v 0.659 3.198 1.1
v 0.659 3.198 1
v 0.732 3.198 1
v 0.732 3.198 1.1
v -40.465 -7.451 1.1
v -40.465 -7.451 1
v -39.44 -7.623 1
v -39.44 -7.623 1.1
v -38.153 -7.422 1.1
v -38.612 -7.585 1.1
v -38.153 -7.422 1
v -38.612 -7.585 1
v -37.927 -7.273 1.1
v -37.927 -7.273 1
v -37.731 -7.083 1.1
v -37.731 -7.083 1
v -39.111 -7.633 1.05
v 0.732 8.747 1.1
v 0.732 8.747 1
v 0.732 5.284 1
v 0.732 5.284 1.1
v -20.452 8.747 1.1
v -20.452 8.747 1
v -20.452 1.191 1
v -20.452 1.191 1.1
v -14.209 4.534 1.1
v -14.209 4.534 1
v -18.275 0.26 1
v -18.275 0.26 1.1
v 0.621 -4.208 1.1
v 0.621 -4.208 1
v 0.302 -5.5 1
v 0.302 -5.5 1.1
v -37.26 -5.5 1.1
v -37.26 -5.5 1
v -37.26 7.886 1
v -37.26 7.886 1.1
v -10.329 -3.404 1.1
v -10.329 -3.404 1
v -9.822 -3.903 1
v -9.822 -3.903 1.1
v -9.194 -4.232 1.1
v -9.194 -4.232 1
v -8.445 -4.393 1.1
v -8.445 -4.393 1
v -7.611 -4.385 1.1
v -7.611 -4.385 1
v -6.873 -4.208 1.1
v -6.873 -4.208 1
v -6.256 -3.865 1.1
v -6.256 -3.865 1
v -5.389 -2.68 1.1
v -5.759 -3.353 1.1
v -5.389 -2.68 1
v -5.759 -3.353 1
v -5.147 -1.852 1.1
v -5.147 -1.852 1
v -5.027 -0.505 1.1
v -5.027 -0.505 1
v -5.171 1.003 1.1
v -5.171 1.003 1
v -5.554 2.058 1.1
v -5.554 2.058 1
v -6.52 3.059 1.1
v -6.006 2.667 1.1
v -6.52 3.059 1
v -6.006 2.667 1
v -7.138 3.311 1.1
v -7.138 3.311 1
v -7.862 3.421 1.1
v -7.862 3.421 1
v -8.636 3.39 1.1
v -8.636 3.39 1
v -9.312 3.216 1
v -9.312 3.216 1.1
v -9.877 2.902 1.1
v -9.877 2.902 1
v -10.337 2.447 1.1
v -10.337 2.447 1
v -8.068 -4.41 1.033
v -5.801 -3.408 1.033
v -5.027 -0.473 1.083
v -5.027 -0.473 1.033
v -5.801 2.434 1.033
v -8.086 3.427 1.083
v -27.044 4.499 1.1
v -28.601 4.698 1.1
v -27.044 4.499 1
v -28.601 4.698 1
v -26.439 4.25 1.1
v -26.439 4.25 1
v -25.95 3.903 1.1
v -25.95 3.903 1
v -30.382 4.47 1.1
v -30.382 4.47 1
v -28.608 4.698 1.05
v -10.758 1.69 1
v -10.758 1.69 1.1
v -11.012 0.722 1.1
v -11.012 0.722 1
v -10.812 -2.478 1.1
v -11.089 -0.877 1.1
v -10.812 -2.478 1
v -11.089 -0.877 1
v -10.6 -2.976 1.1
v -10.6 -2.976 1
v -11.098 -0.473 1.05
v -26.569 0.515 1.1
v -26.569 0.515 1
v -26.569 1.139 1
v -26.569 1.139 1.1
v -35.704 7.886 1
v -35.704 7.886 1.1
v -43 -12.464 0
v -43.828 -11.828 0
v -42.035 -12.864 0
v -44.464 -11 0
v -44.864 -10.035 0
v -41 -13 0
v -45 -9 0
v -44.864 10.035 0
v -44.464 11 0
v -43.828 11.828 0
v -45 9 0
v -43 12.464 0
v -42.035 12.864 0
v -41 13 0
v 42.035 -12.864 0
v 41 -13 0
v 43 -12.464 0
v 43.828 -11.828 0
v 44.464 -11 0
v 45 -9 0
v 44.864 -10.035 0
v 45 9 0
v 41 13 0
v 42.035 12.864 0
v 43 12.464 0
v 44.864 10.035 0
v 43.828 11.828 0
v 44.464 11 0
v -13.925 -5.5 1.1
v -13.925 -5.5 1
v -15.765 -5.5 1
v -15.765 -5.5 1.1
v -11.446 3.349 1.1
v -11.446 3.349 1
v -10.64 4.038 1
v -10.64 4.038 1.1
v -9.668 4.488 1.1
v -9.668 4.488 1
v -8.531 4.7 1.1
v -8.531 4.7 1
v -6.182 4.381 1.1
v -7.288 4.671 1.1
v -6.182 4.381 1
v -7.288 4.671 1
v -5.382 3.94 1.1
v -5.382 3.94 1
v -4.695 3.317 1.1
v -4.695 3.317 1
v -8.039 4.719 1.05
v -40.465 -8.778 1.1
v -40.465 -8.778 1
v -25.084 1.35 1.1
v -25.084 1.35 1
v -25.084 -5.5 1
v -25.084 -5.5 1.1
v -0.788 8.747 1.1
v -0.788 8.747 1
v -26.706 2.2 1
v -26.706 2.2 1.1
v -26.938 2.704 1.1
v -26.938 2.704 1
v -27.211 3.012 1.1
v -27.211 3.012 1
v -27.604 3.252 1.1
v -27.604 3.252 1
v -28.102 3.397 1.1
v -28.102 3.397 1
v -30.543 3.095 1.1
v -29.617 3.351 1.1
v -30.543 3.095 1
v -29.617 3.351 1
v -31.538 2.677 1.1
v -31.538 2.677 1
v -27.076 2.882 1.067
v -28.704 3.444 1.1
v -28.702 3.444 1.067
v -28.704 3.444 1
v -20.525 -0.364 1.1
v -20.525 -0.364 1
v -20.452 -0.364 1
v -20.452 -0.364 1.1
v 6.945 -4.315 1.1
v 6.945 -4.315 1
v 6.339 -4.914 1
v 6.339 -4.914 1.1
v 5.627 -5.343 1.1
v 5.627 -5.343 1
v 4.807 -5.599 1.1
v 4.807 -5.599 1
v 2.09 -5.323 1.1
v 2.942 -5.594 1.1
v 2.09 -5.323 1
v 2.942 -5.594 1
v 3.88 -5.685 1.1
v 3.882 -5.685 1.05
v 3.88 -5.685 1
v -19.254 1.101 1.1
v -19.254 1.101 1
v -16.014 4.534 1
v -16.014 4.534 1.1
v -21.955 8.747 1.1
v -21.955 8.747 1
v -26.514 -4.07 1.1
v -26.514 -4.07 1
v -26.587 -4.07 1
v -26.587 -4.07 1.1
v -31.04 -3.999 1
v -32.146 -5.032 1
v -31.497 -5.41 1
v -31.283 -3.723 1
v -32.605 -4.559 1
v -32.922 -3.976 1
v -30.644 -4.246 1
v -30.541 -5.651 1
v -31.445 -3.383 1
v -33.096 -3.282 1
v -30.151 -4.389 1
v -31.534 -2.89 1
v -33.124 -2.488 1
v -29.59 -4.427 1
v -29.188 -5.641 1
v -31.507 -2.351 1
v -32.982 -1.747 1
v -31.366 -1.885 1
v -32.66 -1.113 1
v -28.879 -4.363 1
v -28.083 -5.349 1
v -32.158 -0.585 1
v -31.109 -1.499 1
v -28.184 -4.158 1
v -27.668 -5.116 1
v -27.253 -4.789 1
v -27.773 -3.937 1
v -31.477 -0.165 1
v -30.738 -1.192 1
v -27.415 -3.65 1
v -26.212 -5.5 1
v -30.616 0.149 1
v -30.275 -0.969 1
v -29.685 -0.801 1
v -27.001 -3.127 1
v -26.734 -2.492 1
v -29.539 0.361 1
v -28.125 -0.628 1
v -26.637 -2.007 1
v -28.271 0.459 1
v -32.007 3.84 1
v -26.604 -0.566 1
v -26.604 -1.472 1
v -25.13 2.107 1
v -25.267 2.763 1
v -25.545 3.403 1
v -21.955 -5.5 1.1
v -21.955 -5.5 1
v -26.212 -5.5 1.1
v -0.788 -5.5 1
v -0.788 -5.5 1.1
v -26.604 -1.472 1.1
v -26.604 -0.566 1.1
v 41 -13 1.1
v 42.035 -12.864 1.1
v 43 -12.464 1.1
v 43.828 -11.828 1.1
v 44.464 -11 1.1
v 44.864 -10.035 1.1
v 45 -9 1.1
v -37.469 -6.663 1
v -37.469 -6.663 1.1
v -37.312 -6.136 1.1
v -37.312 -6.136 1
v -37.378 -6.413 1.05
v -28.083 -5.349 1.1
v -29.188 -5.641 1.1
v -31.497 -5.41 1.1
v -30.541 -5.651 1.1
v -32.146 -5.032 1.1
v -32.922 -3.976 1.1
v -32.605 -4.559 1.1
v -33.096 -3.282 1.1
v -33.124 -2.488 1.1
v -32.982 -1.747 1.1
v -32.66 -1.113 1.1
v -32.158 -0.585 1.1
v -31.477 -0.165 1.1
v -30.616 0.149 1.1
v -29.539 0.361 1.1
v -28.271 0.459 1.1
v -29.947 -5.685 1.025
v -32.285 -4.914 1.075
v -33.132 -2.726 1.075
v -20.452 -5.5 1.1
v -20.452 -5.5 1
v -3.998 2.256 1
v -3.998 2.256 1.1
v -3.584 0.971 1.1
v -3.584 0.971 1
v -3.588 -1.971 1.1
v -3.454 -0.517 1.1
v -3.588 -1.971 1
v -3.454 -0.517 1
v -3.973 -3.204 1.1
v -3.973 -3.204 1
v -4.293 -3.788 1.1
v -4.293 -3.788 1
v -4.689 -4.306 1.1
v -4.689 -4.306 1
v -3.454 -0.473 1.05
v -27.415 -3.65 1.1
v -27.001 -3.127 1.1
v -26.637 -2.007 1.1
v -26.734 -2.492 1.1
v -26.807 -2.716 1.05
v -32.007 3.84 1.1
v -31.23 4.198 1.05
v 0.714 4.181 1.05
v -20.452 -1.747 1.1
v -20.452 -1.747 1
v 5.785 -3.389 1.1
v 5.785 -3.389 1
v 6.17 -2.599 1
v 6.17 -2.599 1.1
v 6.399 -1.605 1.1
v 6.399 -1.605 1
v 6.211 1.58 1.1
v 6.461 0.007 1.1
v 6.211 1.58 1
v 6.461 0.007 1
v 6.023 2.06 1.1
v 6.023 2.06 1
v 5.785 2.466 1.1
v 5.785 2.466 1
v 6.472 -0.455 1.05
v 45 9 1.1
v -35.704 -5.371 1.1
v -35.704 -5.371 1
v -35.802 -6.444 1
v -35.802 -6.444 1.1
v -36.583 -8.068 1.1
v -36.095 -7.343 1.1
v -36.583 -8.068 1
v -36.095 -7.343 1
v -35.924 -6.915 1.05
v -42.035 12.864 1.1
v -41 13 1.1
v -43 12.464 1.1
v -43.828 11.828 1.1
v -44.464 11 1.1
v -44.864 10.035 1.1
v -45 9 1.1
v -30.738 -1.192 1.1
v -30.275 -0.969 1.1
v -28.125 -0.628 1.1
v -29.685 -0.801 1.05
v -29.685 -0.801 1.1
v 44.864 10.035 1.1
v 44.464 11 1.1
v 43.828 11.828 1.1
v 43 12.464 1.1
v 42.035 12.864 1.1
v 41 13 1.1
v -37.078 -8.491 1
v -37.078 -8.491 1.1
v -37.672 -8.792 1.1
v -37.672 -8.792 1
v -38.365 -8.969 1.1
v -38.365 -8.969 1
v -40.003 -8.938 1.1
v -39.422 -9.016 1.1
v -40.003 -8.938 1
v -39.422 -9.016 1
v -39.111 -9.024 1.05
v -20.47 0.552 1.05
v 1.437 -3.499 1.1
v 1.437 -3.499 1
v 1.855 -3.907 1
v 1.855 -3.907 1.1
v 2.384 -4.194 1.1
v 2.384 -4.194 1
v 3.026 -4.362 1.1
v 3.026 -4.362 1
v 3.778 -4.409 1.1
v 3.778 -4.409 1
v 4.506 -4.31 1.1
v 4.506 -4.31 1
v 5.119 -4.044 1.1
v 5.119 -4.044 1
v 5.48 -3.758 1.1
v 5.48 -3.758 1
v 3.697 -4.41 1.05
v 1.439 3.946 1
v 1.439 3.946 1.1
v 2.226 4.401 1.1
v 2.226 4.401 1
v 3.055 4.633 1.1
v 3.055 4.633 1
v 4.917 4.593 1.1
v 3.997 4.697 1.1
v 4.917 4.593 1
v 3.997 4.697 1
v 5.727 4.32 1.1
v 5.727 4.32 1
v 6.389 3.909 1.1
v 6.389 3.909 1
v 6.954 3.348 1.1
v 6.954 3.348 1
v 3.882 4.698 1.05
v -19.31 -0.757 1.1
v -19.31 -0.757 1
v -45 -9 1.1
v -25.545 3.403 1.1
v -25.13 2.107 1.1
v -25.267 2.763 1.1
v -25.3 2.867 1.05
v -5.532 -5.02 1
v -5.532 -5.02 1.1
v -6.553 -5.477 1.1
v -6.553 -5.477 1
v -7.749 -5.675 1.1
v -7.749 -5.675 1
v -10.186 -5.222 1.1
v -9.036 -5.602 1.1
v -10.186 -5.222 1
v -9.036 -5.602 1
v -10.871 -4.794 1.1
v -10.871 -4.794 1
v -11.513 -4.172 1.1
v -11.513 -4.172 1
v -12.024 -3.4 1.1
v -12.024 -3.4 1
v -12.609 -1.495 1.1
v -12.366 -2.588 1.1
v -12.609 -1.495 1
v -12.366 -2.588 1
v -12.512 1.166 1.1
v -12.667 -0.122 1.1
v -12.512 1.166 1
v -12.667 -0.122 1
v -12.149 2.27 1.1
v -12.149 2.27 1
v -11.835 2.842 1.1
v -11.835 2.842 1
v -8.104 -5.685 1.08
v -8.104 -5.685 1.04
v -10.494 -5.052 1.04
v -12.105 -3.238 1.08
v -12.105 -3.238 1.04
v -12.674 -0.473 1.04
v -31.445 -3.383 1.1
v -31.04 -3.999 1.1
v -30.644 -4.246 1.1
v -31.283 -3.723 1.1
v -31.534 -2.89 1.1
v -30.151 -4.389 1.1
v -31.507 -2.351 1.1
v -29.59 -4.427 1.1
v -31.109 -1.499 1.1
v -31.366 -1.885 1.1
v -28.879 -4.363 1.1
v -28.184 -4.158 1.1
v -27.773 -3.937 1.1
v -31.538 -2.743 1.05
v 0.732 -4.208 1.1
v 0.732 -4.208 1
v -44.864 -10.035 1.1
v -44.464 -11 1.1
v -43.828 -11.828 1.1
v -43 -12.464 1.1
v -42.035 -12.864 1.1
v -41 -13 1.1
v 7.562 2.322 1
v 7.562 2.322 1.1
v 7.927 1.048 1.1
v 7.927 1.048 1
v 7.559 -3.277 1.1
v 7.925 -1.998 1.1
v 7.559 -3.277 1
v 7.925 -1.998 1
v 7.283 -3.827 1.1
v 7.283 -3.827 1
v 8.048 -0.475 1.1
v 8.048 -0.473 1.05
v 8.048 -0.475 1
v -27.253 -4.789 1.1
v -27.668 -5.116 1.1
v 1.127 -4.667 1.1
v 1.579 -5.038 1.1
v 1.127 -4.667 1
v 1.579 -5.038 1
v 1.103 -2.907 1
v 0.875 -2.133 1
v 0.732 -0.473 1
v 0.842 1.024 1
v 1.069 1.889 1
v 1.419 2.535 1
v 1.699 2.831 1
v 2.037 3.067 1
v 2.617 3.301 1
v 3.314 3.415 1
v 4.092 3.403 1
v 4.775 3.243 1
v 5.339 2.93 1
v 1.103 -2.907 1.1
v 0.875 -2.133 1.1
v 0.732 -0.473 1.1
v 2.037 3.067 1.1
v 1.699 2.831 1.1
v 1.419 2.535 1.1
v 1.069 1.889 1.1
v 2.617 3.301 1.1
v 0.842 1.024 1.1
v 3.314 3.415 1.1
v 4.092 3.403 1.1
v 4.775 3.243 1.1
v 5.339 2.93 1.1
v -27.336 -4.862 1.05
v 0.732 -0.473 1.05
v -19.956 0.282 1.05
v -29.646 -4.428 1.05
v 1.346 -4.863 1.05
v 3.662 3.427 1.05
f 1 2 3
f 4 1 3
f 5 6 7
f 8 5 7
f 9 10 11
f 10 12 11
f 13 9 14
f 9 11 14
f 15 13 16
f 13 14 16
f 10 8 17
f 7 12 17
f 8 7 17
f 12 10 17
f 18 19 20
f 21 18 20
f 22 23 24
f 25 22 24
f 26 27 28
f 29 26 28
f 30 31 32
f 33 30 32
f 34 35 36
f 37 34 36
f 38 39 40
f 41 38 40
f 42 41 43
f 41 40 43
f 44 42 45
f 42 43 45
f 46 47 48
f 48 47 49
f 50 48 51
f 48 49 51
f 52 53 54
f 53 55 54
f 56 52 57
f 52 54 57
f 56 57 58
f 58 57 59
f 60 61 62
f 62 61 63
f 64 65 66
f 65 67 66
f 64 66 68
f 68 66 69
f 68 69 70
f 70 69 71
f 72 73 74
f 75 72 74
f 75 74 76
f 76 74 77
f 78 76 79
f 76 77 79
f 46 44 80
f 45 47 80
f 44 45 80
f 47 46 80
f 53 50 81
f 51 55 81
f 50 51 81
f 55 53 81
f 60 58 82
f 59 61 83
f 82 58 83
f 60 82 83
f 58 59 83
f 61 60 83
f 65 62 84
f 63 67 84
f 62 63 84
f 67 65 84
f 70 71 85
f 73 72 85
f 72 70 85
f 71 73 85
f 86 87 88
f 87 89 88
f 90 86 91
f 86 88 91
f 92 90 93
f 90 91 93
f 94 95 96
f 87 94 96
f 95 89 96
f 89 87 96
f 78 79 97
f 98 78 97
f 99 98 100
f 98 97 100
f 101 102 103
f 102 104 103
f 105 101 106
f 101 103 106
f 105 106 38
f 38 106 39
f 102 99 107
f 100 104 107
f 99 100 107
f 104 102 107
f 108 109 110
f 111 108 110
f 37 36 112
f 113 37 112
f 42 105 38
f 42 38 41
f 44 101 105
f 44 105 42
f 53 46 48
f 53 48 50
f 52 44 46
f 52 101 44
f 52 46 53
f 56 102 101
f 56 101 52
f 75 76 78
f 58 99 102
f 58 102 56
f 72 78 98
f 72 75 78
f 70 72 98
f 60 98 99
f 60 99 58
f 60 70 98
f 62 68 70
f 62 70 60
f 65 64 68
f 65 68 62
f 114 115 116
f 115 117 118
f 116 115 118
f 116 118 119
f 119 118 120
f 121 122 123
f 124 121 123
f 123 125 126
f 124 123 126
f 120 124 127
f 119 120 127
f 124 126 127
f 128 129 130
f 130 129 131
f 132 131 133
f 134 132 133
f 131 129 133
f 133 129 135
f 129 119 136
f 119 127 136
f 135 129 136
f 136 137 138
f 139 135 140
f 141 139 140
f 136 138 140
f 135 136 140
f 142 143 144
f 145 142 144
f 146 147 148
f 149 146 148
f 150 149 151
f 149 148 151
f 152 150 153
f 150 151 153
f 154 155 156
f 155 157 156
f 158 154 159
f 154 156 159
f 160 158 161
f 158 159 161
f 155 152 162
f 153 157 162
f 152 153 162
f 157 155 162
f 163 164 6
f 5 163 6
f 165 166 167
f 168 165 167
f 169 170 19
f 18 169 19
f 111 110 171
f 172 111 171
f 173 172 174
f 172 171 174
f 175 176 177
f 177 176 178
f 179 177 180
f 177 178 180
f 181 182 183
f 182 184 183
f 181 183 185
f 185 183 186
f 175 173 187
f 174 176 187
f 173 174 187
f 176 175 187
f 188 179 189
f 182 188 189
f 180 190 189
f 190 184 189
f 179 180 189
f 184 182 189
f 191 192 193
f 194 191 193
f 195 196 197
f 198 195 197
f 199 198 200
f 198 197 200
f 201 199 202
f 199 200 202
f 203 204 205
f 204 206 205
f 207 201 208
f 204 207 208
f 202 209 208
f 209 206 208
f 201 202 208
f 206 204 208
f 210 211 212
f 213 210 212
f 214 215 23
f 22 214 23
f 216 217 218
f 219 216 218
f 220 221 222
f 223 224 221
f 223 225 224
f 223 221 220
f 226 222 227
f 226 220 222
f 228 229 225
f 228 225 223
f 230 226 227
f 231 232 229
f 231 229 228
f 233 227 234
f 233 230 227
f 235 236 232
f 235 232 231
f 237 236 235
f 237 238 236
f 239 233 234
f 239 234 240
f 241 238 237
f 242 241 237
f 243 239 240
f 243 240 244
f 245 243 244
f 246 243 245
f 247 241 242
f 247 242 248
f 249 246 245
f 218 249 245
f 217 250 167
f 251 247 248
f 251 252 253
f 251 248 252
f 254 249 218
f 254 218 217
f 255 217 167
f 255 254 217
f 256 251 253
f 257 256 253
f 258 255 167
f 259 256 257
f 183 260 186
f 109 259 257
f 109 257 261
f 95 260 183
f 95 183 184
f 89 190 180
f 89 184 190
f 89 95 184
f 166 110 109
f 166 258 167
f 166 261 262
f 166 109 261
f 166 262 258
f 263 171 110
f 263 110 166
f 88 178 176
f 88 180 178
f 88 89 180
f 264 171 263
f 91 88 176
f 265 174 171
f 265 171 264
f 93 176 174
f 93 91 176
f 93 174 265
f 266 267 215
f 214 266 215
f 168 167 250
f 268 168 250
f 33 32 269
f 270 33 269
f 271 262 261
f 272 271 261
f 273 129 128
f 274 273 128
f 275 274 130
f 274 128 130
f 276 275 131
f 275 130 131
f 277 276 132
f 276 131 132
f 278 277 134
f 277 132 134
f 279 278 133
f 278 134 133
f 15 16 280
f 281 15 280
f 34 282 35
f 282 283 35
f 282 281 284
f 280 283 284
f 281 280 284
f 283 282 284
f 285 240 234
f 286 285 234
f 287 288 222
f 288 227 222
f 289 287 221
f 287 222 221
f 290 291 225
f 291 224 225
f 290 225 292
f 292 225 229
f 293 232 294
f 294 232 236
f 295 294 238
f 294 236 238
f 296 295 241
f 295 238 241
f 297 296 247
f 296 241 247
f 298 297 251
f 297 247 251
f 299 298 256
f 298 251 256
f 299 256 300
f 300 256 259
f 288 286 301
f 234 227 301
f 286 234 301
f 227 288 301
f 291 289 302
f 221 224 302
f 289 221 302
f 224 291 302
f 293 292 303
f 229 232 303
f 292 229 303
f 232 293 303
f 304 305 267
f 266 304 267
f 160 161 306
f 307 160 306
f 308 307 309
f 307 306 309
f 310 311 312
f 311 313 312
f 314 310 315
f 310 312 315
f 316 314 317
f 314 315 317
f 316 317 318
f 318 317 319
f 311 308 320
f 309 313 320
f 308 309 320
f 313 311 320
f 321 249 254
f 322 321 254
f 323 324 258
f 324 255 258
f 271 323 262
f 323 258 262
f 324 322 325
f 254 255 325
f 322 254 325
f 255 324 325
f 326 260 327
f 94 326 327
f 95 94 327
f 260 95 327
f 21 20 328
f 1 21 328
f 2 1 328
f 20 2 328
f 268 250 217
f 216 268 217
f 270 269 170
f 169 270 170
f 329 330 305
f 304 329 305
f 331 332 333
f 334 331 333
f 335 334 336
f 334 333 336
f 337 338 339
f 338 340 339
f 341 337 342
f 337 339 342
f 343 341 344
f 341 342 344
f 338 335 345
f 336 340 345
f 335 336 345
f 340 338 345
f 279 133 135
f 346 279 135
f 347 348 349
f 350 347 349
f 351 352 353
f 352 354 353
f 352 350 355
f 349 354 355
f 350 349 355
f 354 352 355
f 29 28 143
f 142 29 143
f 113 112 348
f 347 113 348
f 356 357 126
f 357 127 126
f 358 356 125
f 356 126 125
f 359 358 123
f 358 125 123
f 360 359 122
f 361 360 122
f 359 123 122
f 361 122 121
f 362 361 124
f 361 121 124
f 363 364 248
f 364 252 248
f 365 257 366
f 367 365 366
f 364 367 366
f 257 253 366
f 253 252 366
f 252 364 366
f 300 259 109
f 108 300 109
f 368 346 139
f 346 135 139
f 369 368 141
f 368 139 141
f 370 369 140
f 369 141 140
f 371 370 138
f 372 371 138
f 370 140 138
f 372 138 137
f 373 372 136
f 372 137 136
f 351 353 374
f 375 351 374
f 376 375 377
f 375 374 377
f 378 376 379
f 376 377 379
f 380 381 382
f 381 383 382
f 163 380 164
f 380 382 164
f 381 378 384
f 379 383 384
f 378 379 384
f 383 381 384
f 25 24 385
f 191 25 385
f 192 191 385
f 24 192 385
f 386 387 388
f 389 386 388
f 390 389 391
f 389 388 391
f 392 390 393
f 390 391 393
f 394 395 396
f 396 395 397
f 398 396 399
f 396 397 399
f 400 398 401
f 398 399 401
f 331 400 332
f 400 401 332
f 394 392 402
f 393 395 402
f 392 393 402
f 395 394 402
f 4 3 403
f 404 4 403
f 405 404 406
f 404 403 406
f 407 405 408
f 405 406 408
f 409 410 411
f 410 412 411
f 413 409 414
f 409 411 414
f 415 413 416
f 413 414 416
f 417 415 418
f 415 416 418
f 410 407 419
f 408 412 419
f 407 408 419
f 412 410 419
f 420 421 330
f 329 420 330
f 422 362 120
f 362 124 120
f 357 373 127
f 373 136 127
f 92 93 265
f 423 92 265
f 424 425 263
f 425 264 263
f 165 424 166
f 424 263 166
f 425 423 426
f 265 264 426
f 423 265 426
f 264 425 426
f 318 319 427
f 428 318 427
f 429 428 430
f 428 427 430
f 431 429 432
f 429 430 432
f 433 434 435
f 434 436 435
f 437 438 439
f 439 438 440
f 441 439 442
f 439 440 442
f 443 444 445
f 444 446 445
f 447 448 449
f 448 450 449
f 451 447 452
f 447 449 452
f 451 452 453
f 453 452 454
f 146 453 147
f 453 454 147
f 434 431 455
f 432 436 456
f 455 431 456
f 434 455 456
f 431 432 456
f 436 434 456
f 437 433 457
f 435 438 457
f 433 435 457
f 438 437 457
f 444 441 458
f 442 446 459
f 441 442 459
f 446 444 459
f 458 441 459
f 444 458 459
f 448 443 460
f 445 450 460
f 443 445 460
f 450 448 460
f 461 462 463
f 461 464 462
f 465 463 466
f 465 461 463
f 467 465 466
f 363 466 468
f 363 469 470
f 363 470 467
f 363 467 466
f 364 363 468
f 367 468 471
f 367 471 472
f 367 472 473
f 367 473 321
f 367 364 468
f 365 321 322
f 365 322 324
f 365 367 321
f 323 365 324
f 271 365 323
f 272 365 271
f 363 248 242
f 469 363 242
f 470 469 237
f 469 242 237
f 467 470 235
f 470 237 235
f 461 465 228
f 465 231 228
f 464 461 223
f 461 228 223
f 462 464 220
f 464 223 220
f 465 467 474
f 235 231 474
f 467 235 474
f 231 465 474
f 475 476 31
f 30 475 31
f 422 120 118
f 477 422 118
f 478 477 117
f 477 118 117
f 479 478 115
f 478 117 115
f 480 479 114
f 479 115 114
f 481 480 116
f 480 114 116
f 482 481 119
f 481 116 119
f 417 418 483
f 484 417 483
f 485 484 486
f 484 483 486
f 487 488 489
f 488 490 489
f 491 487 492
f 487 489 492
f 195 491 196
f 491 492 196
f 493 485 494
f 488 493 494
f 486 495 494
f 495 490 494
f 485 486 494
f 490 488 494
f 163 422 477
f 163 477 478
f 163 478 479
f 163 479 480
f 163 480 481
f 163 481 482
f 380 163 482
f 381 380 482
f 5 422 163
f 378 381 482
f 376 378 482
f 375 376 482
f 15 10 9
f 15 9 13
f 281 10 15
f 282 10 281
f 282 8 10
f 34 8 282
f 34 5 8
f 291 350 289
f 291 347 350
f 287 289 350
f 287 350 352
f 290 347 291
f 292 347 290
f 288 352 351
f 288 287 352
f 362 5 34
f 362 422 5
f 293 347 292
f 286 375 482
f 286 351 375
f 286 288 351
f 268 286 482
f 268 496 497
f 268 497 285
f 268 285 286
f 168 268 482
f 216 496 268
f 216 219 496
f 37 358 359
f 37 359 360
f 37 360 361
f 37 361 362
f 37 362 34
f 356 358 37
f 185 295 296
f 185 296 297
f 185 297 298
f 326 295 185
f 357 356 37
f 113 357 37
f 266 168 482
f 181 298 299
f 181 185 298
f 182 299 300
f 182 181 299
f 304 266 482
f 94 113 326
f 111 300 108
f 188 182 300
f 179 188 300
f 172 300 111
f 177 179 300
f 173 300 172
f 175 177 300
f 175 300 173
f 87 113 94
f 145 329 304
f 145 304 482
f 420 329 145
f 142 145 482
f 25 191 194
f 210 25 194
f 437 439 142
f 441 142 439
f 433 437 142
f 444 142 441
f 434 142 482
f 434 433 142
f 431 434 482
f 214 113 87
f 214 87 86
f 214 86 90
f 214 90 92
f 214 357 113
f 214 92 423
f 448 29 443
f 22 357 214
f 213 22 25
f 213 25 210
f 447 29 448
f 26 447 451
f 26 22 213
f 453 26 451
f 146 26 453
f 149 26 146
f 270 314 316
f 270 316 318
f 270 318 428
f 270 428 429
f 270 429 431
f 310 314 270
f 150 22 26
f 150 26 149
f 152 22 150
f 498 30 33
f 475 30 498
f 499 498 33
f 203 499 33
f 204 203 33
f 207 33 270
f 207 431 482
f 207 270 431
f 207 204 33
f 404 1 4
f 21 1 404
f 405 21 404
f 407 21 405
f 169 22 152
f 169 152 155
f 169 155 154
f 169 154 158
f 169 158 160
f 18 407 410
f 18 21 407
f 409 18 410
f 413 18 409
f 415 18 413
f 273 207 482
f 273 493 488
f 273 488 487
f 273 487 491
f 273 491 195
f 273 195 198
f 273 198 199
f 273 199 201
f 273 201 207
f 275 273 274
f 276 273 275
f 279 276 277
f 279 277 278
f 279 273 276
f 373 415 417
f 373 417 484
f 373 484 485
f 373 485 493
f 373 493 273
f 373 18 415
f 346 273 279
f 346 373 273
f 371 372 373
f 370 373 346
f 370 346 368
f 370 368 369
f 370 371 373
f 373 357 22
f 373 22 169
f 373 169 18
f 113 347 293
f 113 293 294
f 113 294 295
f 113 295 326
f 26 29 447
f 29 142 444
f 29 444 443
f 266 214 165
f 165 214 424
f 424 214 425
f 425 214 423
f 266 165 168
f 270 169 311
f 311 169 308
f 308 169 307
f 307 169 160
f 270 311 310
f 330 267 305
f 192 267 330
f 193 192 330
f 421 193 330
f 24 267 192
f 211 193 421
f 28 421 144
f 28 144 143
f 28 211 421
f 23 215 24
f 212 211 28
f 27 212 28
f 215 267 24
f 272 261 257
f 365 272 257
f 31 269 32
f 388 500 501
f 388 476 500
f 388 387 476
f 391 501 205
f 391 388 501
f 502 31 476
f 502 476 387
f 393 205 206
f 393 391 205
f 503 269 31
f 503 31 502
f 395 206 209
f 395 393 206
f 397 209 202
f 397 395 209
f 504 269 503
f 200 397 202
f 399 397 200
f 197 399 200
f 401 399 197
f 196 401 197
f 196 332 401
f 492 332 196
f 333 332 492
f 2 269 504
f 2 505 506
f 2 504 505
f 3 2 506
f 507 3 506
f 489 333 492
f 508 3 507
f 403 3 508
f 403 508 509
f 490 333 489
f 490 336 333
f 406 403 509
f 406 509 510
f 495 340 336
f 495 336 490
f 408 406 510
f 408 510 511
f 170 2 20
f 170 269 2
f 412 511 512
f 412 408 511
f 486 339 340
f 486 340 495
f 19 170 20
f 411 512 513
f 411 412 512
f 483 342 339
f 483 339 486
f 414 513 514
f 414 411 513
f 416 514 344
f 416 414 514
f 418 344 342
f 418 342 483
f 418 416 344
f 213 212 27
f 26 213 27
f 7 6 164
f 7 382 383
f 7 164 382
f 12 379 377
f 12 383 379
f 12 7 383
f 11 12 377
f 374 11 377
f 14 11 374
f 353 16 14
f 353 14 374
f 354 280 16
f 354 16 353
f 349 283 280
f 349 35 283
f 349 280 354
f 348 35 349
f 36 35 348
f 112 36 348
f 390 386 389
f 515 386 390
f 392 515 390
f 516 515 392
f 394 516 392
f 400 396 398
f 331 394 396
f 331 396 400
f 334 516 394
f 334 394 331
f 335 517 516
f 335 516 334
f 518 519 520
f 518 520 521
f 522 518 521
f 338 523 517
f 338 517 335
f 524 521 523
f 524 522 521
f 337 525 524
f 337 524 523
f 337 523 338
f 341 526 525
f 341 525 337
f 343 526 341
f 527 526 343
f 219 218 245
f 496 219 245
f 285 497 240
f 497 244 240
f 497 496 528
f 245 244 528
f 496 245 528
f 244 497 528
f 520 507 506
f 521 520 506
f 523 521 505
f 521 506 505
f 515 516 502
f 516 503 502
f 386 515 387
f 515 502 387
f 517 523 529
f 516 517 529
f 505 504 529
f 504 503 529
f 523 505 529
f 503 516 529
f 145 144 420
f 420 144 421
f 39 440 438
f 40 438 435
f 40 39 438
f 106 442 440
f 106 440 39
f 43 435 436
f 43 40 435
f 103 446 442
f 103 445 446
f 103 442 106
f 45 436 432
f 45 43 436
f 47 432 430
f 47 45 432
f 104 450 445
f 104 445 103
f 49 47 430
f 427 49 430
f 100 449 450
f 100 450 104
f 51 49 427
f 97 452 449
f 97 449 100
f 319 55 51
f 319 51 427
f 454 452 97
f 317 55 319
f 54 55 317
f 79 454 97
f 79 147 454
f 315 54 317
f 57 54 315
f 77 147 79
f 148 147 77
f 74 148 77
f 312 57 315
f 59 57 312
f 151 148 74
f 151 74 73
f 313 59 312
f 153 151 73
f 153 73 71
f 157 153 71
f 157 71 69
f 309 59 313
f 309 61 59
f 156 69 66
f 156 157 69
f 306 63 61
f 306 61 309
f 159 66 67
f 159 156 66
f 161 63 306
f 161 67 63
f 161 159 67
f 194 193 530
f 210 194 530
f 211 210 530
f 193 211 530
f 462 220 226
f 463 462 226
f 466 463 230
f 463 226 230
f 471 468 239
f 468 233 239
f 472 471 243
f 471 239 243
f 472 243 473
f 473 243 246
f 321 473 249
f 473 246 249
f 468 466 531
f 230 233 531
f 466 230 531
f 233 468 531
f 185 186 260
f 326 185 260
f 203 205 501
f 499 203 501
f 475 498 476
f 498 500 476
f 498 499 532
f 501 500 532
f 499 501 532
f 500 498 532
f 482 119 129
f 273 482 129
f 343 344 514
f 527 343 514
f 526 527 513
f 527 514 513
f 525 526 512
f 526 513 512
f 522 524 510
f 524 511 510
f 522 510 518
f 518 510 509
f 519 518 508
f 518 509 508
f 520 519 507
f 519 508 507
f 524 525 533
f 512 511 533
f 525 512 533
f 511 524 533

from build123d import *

# Parameters (mm, degrees)
F1_DEPTH = 1
F3_DEPTH = 0.1


with BuildPart() as f1:
    # F0 (on Top) → F1 (new body)
    with BuildSketch(Plane.XY):
        with BuildLine():
            ThreePointArc((45, 9), (43.8284271247, 11.8284271247), (41, 13))
            Line((41, 13), (-41, 13))
            ThreePointArc((-41, 13), (-43.8284271247, 11.8284271247), (-45, 9))
            Line((-45, 9), (-45, -9))
            ThreePointArc((-45, -9), (-43.8284271247, -11.8284271247), (-41, -13))
            Line((-41, -13), (41, -13))
            ThreePointArc((41, -13), (43.8284271247, -11.8284271247), (45, -9))
            Line((45, -9), (45, 9))
        make_face()
    extrude(amount=F1_DEPTH)

    # F2 (on face) → F3 (join)
    with BuildSketch(Plane.XY.offset(1)):
        with BuildLine():
            Line((45, -9), (45, 9))
            ThreePointArc((45, 9), (43.8284271247, 11.8284271247), (41, 13))
            Line((41, 13), (-41, 13))
            ThreePointArc((-41, 13), (-43.8284271247, 11.8284271247), (-45, 9))
            Line((-45, 9), (-45, -9))
            ThreePointArc((-45, -9), (-43.8284271247, -11.8284271247), (-41, -13))
            Line((-41, -13), (41, -13))
            ThreePointArc((41, -13), (43.8284271247, -11.8284271247), (45, -9))
        make_face()
        with BuildLine():
            Line((-40, 10), (40, 10))
            ThreePointArc((40, 10), (41.4142135624, 9.4142135624), (42, 8))
            Line((42, 8), (42, -8))
            ThreePointArc((42, -8), (41.4142135624, -9.4142135624), (40, -10))
            Line((40, -10), (-40, -10))
            ThreePointArc((-40, -10), (-41.4142135624, -9.4142135624), (-42, -8))
            Line((-42, -8), (-42, 8))
            ThreePointArc((-42, 8), (-41.4142135624, 9.4142135624), (-40, 10))
        make_face(mode=Mode.SUBTRACT)
        with BuildLine():
            ThreePointArc((42, 8), (41.4142135624, 9.4142135624), (40, 10))
            Line((40, 10), (-40, 10))
            ThreePointArc((-40, 10), (-41.4142135624, 9.4142135624), (-42, 8))
            Line((-42, 8), (-42, -8))
            ThreePointArc((-42, -8), (-41.4142135624, -9.4142135624), (-40, -10))
            Line((-40, -10), (40, -10))
            ThreePointArc((40, -10), (41.4142135624, -9.4142135624), (42, -8))
            Line((42, -8), (42, 8))
        make_face()
        with BuildLine():
            add(Edge.make_bspline(
                [(-36.5830078125, -8.0678710938), (-37.4619140625, -9.0244140625), (-39.111328125, -9.0244140625)],
                knots=[0, 0, 0, 1, 1, 1], degree=2))
            add(Edge.make_bspline(
                [(-39.111328125, -9.0244140625), (-39.9697265625, -9.0244140625), (-40.46484375, -8.7783203125)],
                knots=[0, 0, 0, 1, 1, 1], degree=2))
            Line((-40.46484375, -8.7783203125), (-40.46484375, -7.451171875))
            add(Edge.make_bspline(
                [(-40.46484375, -7.451171875), (-39.814453125, -7.6328125), (-39.111328125, -7.6328125)],
                knots=[0, 0, 0, 1, 1, 1], degree=2))
            add(Edge.make_bspline(
                [(-39.111328125, -7.6328125), (-38.203125, -7.6328125), (-37.7314453125, -7.0834960938)],
                knots=[0, 0, 0, 1, 1, 1], degree=2))
            add(Edge.make_bspline(
                [(-37.7314453125, -7.0834960938), (-37.259765625, -6.5341796875), (-37.259765625, -5.5)],
                knots=[0, 0, 0, 1, 1, 1], degree=2))
            Line((-37.259765625, -5.5), (-37.259765625, 7.8857421875))
            Line((-37.259765625, 7.8857421875), (-35.7041015625, 7.8857421875))
            Line((-35.7041015625, 7.8857421875), (-35.7041015625, -5.37109375))
            add(Edge.make_bspline(
                [(-35.7041015625, -5.37109375), (-35.7041015625, -7.111328125), (-36.5830078125, -8.0678710938)],
                knots=[0, 0, 0, 1, 1, 1], degree=2))
        make_face(mode=Mode.SUBTRACT)
        with BuildLine():
            Line((-25.083984375, -5.5), (-26.2119140625, -5.5))
            Line((-26.2119140625, -5.5), (-26.513671875, -4.0703125))
            Line((-26.513671875, -4.0703125), (-26.5869140625, -4.0703125))
            add(Edge.make_bspline(
                [(-26.5869140625, -4.0703125), (-27.3369140625, -5.013671875), (-28.0825195312, -5.3491210938)],
                knots=[0, 0, 0, 1, 1, 1], degree=2))
            add(Edge.make_bspline(
                [(-28.0825195312, -5.3491210938), (-28.828125, -5.6845703125), (-29.947265625, -5.6845703125)],
                knots=[0, 0, 0, 1, 1, 1], degree=2))
            add(Edge.make_bspline(
                [(-29.947265625, -5.6845703125), (-31.4384765625, -5.6845703125), (-32.28515625, -4.9140625)],
                knots=[0, 0, 0, 1, 1, 1], degree=2))
            add(Edge.make_bspline(
                [(-32.28515625, -4.9140625), (-33.1318359375, -4.1435546875), (-33.1318359375, -2.7255859375)],
                knots=[0, 0, 0, 1, 1, 1], degree=2))
            add(Edge.make_bspline(
                [(-33.1318359375, -2.7255859375), (-33.1318359375, 0.3125), (-28.271484375, 0.458984375)],
                knots=[0, 0, 0, 1, 1, 1], degree=2))
            Line((-28.271484375, 0.458984375), (-26.5693359375, 0.5146484375))
            Line((-26.5693359375, 0.5146484375), (-26.5693359375, 1.138671875))
            add(Edge.make_bspline(
                [(-26.5693359375, 1.138671875), (-26.5693359375, 2.3193359375), (-27.076171875, 2.8818359375)],
                knots=[0, 0, 0, 1, 1, 1], degree=2))
            add(Edge.make_bspline(
                [(-27.076171875, 2.8818359375), (-27.5830078125, 3.4443359375), (-28.7021484375, 3.4443359375)],
                knots=[0, 0, 0, 1, 1, 1], degree=2))
            add(Edge.make_bspline(
                [(-28.7021484375, 3.4443359375), (-29.9560546875, 3.4443359375), (-31.5380859375, 2.6767578125)],
                knots=[0, 0, 0, 1, 1, 1], degree=2))
            Line((-31.5380859375, 2.6767578125), (-32.0068359375, 3.83984375))
            add(Edge.make_bspline(
                [(-32.0068359375, 3.83984375), (-31.265625, 4.2412109375), (-30.3823242188, 4.4697265625)],
                knots=[0, 0, 0, 1, 1, 1], degree=2))
            add(Edge.make_bspline(
                [(-30.3823242188, 4.4697265625), (-29.4990234375, 4.6982421875), (-28.6083984375, 4.6982421875)],
                knots=[0, 0, 0, 1, 1, 1], degree=2))
            add(Edge.make_bspline(
                [(-28.6083984375, 4.6982421875), (-26.8154296875, 4.6982421875), (-25.9497070312, 3.9028320312)],
                knots=[0, 0, 0, 1, 1, 1], degree=2))
            add(Edge.make_bspline(
                [(-25.9497070312, 3.9028320312), (-25.083984375, 3.107421875), (-25.083984375, 1.349609375)],
                knots=[0, 0, 0, 1, 1, 1], degree=2))
            Line((-25.083984375, 1.349609375), (-25.083984375, -5.5))
        make_face(mode=Mode.SUBTRACT)
        with BuildLine():
            add(Edge.make_bspline(
                [(-4.6948242187, 3.3168945312), (-3.4541015625, 1.9150390625), (-3.4541015625, -0.47265625)],
                knots=[0, 0, 0, 1, 1, 1], degree=2))
            add(Edge.make_bspline(
                [(-3.4541015625, -0.47265625), (-3.4541015625, -2.927734375), (-4.6889648437, -4.3061523438)],
                knots=[0, 0, 0, 1, 1, 1], degree=2))
            add(Edge.make_bspline(
                [(-4.6889648437, -4.3061523438), (-5.923828125, -5.6845703125), (-8.103515625, -5.6845703125)],
                knots=[0, 0, 0, 1, 1, 1], degree=2))
            add(Edge.make_bspline(
                [(-8.103515625, -5.6845703125), (-9.451171875, -5.6845703125), (-10.494140625, -5.0517578125)],
                knots=[0, 0, 0, 1, 1, 1], degree=2))
            add(Edge.make_bspline(
                [(-10.494140625, -5.0517578125), (-11.537109375, -4.4189453125), (-12.10546875, -3.23828125)],
                knots=[0, 0, 0, 1, 1, 1], degree=2))
            add(Edge.make_bspline(
                [(-12.10546875, -3.23828125), (-12.673828125, -2.0576171875), (-12.673828125, -0.47265625)],
                knots=[0, 0, 0, 1, 1, 1], degree=2))
            add(Edge.make_bspline(
                [(-12.673828125, -0.47265625), (-12.673828125, 1.9794921875), (-11.4462890625, 3.3491210937)],
                knots=[0, 0, 0, 1, 1, 1], degree=2))
            add(Edge.make_bspline(
                [(-11.4462890625, 3.3491210937), (-10.21875, 4.71875), (-8.0390625, 4.71875)],
                knots=[0, 0, 0, 1, 1, 1], degree=2))
            add(Edge.make_bspline(
                [(-8.0390625, 4.71875), (-5.935546875, 4.71875), (-4.6948242187, 3.3168945312)],
                knots=[0, 0, 0, 1, 1, 1], degree=2))
        make_face(mode=Mode.SUBTRACT)
        with BuildLine():
            Line((-20.525390625, -0.3642578125), (-20.4521484375, -0.3642578125))
            add(Edge.make_bspline(
                [(-20.4521484375, -0.3642578125), (-20.0595703125, 0.1953125), (-19.25390625, 1.1005859375)],
                knots=[0, 0, 0, 1, 1, 1], degree=2))
            Line((-19.25390625, 1.1005859375), (-16.013671875, 4.5341796875))
            Line((-16.013671875, 4.5341796875), (-14.208984375, 4.5341796875))
            Line((-14.208984375, 4.5341796875), (-18.275390625, 0.259765625))
            Line((-18.275390625, 0.259765625), (-13.9248046875, -5.5))
            Line((-13.9248046875, -5.5), (-15.7646484375, -5.5))
            Line((-15.7646484375, -5.5), (-19.3095703125, -0.7568359375))
            Line((-19.3095703125, -0.7568359375), (-20.4521484375, -1.7470703125))
            Line((-20.4521484375, -1.7470703125), (-20.4521484375, -5.5))
            Line((-20.4521484375, -5.5), (-21.955078125, -5.5))
            Line((-21.955078125, -5.5), (-21.955078125, 8.7470703125))
            Line((-21.955078125, 8.7470703125), (-20.4521484375, 8.7470703125))
            Line((-20.4521484375, 8.7470703125), (-20.4521484375, 1.19140625))
            add(Edge.make_bspline(
                [(-20.4521484375, 1.19140625), (-20.4521484375, 0.6904296875), (-20.525390625, -0.3642578125)],
                knots=[0, 0, 0, 1, 1, 1], degree=2))
        make_face(mode=Mode.SUBTRACT)
        with BuildLine():
            add(Edge.make_bspline(
                [(0.732421875, 3.1982421875), (1.79296875, 4.6982421875), (3.8818359375, 4.6982421875)],
                knots=[0, 0, 0, 1, 1, 1], degree=2))
            add(Edge.make_bspline(
                [(3.8818359375, 4.6982421875), (5.859375, 4.6982421875), (6.9536132813, 3.34765625)],
                knots=[0, 0, 0, 1, 1, 1], degree=2))
            add(Edge.make_bspline(
                [(6.9536132813, 3.34765625), (8.0478515625, 1.9970703125), (8.0478515625, -0.47265625)],
                knots=[0, 0, 0, 1, 1, 1], degree=2))
            add(Edge.make_bspline(
                [(8.0478515625, -0.47265625), (8.0478515625, -2.9453125), (6.9448242188, -4.3149414063)],
                knots=[0, 0, 0, 1, 1, 1], degree=2))
            add(Edge.make_bspline(
                [(6.9448242188, -4.3149414063), (5.841796875, -5.6845703125), (3.8818359375, -5.6845703125)],
                knots=[0, 0, 0, 1, 1, 1], degree=2))
            add(Edge.make_bspline(
                [(3.8818359375, -5.6845703125), (2.900390625, -5.6845703125), (2.0903320313, -5.3227539063)],
                knots=[0, 0, 0, 1, 1, 1], degree=2))
            add(Edge.make_bspline(
                [(2.0903320313, -5.3227539063), (1.2802734375, -4.9609375), (0.732421875, -4.2080078125)],
                knots=[0, 0, 0, 1, 1, 1], degree=2))
            Line((0.732421875, -4.2080078125), (0.62109375, -4.2080078125))
            Line((0.62109375, -4.2080078125), (0.3017578125, -5.5))
            Line((0.3017578125, -5.5), (-0.7880859375, -5.5))
            Line((-0.7880859375, -5.5), (-0.7880859375, 8.7470703125))
            Line((-0.7880859375, 8.7470703125), (0.732421875, 8.7470703125))
            Line((0.732421875, 8.7470703125), (0.732421875, 5.2841796875))
            add(Edge.make_bspline(
                [(0.732421875, 5.2841796875), (0.732421875, 4.12109375), (0.6591796875, 3.1982421875)],
                knots=[0, 0, 0, 1, 1, 1], degree=2))
            Line((0.6591796875, 3.1982421875), (0.732421875, 3.1982421875))
        make_face(mode=Mode.SUBTRACT)
        with BuildLine():
            add(Edge.make_bspline(
                [(-31.0400390625, -3.9985351563), (-30.5419921875, -4.427734375), (-29.6455078125, -4.427734375)],
                knots=[0, 0, 0, 1, 1, 1], degree=2))
            add(Edge.make_bspline(
                [(-29.6455078125, -4.427734375), (-28.224609375, -4.427734375), (-27.4145507812, -3.6499023438)],
                knots=[0, 0, 0, 1, 1, 1], degree=2))
            add(Edge.make_bspline(
                [(-27.4145507812, -3.6499023438), (-26.6044921875, -2.8720703125), (-26.6044921875, -1.4716796875)],
                knots=[0, 0, 0, 1, 1, 1], degree=2))
            Line((-26.6044921875, -1.4716796875), (-26.6044921875, -0.56640625))
            Line((-26.6044921875, -0.56640625), (-28.125, -0.6279296875))
            add(Edge.make_bspline(
                [(-28.125, -0.6279296875), (-29.9384765625, -0.6923828125), (-30.73828125, -1.1918945313)],
                knots=[0, 0, 0, 1, 1, 1], degree=2))
            add(Edge.make_bspline(
                [(-30.73828125, -1.1918945313), (-31.5380859375, -1.69140625), (-31.5380859375, -2.7431640625)],
                knots=[0, 0, 0, 1, 1, 1], degree=2))
            add(Edge.make_bspline(
                [(-31.5380859375, -2.7431640625), (-31.5380859375, -3.5693359375), (-31.0400390625, -3.9985351563)],
                knots=[0, 0, 0, 1, 1, 1], degree=2))
        make_face()
        with BuildLine():
            add(Edge.make_bspline(
                [(-10.3374023437, 2.4467773437), (-11.09765625, 1.466796875), (-11.09765625, -0.47265625)],
                knots=[0, 0, 0, 1, 1, 1], degree=2))
            add(Edge.make_bspline(
                [(-11.09765625, -0.47265625), (-11.09765625, -2.3974609375), (-10.3286132812, -3.4038085938)],
                knots=[0, 0, 0, 1, 1, 1], degree=2))
            add(Edge.make_bspline(
                [(-10.3286132812, -3.4038085938), (-9.5595703125, -4.41015625), (-8.068359375, -4.41015625)],
                knots=[0, 0, 0, 1, 1, 1], degree=2))
            add(Edge.make_bspline(
                [(-8.068359375, -4.41015625), (-6.57421875, -4.41015625), (-5.80078125, -3.408203125)],
                knots=[0, 0, 0, 1, 1, 1], degree=2))
            add(Edge.make_bspline(
                [(-5.80078125, -3.408203125), (-5.02734375, -2.40625), (-5.02734375, -0.47265625)],
                knots=[0, 0, 0, 1, 1, 1], degree=2))
            add(Edge.make_bspline(
                [(-5.02734375, -0.47265625), (-5.02734375, 1.4404296875), (-5.80078125, 2.43359375)],
                knots=[0, 0, 0, 1, 1, 1], degree=2))
            add(Edge.make_bspline(
                [(-5.80078125, 2.43359375), (-6.57421875, 3.4267578125), (-8.0859375, 3.4267578125)],
                knots=[0, 0, 0, 1, 1, 1], degree=2))
            add(Edge.make_bspline(
                [(-8.0859375, 3.4267578125), (-9.5771484375, 3.4267578125), (-10.3374023437, 2.4467773437)],
                knots=[0, 0, 0, 1, 1, 1], degree=2))
        make_face()
        with BuildLine():
            add(Edge.make_bspline(
                [(5.7846679688, 2.4658203125), (5.09765625, 3.4267578125), (3.662109375, 3.4267578125)],
                knots=[0, 0, 0, 1, 1, 1], degree=2))
            add(Edge.make_bspline(
                [(3.662109375, 3.4267578125), (2.1064453125, 3.4267578125), (1.4194335938, 2.5346679687)],
                knots=[0, 0, 0, 1, 1, 1], degree=2))
            add(Edge.make_bspline(
                [(1.4194335938, 2.5346679687), (0.732421875, 1.642578125), (0.732421875, -0.47265625)],
                knots=[0, 0, 0, 1, 1, 1], degree=2))
            add(Edge.make_bspline(
                [(0.732421875, -0.47265625), (0.732421875, -2.587890625), (1.4370117188, -3.4990234375)],
                knots=[0, 0, 0, 1, 1, 1], degree=2))
            add(Edge.make_bspline(
                [(1.4370117188, -3.4990234375), (2.1416015625, -4.41015625), (3.697265625, -4.41015625)],
                knots=[0, 0, 0, 1, 1, 1], degree=2))
            add(Edge.make_bspline(
                [(3.697265625, -4.41015625), (5.09765625, -4.41015625), (5.7846679688, -3.3891601563)],
                knots=[0, 0, 0, 1, 1, 1], degree=2))
            add(Edge.make_bspline(
                [(5.7846679688, -3.3891601563), (6.4716796875, -2.3681640625), (6.4716796875, -0.455078125)],
                knots=[0, 0, 0, 1, 1, 1], degree=2))
            add(Edge.make_bspline(
                [(6.4716796875, -0.455078125), (6.4716796875, 1.5048828125), (5.7846679688, 2.4658203125)],
                knots=[0, 0, 0, 1, 1, 1], degree=2))
        make_face()
    extrude(amount=F3_DEPTH)


solid = f1.part
